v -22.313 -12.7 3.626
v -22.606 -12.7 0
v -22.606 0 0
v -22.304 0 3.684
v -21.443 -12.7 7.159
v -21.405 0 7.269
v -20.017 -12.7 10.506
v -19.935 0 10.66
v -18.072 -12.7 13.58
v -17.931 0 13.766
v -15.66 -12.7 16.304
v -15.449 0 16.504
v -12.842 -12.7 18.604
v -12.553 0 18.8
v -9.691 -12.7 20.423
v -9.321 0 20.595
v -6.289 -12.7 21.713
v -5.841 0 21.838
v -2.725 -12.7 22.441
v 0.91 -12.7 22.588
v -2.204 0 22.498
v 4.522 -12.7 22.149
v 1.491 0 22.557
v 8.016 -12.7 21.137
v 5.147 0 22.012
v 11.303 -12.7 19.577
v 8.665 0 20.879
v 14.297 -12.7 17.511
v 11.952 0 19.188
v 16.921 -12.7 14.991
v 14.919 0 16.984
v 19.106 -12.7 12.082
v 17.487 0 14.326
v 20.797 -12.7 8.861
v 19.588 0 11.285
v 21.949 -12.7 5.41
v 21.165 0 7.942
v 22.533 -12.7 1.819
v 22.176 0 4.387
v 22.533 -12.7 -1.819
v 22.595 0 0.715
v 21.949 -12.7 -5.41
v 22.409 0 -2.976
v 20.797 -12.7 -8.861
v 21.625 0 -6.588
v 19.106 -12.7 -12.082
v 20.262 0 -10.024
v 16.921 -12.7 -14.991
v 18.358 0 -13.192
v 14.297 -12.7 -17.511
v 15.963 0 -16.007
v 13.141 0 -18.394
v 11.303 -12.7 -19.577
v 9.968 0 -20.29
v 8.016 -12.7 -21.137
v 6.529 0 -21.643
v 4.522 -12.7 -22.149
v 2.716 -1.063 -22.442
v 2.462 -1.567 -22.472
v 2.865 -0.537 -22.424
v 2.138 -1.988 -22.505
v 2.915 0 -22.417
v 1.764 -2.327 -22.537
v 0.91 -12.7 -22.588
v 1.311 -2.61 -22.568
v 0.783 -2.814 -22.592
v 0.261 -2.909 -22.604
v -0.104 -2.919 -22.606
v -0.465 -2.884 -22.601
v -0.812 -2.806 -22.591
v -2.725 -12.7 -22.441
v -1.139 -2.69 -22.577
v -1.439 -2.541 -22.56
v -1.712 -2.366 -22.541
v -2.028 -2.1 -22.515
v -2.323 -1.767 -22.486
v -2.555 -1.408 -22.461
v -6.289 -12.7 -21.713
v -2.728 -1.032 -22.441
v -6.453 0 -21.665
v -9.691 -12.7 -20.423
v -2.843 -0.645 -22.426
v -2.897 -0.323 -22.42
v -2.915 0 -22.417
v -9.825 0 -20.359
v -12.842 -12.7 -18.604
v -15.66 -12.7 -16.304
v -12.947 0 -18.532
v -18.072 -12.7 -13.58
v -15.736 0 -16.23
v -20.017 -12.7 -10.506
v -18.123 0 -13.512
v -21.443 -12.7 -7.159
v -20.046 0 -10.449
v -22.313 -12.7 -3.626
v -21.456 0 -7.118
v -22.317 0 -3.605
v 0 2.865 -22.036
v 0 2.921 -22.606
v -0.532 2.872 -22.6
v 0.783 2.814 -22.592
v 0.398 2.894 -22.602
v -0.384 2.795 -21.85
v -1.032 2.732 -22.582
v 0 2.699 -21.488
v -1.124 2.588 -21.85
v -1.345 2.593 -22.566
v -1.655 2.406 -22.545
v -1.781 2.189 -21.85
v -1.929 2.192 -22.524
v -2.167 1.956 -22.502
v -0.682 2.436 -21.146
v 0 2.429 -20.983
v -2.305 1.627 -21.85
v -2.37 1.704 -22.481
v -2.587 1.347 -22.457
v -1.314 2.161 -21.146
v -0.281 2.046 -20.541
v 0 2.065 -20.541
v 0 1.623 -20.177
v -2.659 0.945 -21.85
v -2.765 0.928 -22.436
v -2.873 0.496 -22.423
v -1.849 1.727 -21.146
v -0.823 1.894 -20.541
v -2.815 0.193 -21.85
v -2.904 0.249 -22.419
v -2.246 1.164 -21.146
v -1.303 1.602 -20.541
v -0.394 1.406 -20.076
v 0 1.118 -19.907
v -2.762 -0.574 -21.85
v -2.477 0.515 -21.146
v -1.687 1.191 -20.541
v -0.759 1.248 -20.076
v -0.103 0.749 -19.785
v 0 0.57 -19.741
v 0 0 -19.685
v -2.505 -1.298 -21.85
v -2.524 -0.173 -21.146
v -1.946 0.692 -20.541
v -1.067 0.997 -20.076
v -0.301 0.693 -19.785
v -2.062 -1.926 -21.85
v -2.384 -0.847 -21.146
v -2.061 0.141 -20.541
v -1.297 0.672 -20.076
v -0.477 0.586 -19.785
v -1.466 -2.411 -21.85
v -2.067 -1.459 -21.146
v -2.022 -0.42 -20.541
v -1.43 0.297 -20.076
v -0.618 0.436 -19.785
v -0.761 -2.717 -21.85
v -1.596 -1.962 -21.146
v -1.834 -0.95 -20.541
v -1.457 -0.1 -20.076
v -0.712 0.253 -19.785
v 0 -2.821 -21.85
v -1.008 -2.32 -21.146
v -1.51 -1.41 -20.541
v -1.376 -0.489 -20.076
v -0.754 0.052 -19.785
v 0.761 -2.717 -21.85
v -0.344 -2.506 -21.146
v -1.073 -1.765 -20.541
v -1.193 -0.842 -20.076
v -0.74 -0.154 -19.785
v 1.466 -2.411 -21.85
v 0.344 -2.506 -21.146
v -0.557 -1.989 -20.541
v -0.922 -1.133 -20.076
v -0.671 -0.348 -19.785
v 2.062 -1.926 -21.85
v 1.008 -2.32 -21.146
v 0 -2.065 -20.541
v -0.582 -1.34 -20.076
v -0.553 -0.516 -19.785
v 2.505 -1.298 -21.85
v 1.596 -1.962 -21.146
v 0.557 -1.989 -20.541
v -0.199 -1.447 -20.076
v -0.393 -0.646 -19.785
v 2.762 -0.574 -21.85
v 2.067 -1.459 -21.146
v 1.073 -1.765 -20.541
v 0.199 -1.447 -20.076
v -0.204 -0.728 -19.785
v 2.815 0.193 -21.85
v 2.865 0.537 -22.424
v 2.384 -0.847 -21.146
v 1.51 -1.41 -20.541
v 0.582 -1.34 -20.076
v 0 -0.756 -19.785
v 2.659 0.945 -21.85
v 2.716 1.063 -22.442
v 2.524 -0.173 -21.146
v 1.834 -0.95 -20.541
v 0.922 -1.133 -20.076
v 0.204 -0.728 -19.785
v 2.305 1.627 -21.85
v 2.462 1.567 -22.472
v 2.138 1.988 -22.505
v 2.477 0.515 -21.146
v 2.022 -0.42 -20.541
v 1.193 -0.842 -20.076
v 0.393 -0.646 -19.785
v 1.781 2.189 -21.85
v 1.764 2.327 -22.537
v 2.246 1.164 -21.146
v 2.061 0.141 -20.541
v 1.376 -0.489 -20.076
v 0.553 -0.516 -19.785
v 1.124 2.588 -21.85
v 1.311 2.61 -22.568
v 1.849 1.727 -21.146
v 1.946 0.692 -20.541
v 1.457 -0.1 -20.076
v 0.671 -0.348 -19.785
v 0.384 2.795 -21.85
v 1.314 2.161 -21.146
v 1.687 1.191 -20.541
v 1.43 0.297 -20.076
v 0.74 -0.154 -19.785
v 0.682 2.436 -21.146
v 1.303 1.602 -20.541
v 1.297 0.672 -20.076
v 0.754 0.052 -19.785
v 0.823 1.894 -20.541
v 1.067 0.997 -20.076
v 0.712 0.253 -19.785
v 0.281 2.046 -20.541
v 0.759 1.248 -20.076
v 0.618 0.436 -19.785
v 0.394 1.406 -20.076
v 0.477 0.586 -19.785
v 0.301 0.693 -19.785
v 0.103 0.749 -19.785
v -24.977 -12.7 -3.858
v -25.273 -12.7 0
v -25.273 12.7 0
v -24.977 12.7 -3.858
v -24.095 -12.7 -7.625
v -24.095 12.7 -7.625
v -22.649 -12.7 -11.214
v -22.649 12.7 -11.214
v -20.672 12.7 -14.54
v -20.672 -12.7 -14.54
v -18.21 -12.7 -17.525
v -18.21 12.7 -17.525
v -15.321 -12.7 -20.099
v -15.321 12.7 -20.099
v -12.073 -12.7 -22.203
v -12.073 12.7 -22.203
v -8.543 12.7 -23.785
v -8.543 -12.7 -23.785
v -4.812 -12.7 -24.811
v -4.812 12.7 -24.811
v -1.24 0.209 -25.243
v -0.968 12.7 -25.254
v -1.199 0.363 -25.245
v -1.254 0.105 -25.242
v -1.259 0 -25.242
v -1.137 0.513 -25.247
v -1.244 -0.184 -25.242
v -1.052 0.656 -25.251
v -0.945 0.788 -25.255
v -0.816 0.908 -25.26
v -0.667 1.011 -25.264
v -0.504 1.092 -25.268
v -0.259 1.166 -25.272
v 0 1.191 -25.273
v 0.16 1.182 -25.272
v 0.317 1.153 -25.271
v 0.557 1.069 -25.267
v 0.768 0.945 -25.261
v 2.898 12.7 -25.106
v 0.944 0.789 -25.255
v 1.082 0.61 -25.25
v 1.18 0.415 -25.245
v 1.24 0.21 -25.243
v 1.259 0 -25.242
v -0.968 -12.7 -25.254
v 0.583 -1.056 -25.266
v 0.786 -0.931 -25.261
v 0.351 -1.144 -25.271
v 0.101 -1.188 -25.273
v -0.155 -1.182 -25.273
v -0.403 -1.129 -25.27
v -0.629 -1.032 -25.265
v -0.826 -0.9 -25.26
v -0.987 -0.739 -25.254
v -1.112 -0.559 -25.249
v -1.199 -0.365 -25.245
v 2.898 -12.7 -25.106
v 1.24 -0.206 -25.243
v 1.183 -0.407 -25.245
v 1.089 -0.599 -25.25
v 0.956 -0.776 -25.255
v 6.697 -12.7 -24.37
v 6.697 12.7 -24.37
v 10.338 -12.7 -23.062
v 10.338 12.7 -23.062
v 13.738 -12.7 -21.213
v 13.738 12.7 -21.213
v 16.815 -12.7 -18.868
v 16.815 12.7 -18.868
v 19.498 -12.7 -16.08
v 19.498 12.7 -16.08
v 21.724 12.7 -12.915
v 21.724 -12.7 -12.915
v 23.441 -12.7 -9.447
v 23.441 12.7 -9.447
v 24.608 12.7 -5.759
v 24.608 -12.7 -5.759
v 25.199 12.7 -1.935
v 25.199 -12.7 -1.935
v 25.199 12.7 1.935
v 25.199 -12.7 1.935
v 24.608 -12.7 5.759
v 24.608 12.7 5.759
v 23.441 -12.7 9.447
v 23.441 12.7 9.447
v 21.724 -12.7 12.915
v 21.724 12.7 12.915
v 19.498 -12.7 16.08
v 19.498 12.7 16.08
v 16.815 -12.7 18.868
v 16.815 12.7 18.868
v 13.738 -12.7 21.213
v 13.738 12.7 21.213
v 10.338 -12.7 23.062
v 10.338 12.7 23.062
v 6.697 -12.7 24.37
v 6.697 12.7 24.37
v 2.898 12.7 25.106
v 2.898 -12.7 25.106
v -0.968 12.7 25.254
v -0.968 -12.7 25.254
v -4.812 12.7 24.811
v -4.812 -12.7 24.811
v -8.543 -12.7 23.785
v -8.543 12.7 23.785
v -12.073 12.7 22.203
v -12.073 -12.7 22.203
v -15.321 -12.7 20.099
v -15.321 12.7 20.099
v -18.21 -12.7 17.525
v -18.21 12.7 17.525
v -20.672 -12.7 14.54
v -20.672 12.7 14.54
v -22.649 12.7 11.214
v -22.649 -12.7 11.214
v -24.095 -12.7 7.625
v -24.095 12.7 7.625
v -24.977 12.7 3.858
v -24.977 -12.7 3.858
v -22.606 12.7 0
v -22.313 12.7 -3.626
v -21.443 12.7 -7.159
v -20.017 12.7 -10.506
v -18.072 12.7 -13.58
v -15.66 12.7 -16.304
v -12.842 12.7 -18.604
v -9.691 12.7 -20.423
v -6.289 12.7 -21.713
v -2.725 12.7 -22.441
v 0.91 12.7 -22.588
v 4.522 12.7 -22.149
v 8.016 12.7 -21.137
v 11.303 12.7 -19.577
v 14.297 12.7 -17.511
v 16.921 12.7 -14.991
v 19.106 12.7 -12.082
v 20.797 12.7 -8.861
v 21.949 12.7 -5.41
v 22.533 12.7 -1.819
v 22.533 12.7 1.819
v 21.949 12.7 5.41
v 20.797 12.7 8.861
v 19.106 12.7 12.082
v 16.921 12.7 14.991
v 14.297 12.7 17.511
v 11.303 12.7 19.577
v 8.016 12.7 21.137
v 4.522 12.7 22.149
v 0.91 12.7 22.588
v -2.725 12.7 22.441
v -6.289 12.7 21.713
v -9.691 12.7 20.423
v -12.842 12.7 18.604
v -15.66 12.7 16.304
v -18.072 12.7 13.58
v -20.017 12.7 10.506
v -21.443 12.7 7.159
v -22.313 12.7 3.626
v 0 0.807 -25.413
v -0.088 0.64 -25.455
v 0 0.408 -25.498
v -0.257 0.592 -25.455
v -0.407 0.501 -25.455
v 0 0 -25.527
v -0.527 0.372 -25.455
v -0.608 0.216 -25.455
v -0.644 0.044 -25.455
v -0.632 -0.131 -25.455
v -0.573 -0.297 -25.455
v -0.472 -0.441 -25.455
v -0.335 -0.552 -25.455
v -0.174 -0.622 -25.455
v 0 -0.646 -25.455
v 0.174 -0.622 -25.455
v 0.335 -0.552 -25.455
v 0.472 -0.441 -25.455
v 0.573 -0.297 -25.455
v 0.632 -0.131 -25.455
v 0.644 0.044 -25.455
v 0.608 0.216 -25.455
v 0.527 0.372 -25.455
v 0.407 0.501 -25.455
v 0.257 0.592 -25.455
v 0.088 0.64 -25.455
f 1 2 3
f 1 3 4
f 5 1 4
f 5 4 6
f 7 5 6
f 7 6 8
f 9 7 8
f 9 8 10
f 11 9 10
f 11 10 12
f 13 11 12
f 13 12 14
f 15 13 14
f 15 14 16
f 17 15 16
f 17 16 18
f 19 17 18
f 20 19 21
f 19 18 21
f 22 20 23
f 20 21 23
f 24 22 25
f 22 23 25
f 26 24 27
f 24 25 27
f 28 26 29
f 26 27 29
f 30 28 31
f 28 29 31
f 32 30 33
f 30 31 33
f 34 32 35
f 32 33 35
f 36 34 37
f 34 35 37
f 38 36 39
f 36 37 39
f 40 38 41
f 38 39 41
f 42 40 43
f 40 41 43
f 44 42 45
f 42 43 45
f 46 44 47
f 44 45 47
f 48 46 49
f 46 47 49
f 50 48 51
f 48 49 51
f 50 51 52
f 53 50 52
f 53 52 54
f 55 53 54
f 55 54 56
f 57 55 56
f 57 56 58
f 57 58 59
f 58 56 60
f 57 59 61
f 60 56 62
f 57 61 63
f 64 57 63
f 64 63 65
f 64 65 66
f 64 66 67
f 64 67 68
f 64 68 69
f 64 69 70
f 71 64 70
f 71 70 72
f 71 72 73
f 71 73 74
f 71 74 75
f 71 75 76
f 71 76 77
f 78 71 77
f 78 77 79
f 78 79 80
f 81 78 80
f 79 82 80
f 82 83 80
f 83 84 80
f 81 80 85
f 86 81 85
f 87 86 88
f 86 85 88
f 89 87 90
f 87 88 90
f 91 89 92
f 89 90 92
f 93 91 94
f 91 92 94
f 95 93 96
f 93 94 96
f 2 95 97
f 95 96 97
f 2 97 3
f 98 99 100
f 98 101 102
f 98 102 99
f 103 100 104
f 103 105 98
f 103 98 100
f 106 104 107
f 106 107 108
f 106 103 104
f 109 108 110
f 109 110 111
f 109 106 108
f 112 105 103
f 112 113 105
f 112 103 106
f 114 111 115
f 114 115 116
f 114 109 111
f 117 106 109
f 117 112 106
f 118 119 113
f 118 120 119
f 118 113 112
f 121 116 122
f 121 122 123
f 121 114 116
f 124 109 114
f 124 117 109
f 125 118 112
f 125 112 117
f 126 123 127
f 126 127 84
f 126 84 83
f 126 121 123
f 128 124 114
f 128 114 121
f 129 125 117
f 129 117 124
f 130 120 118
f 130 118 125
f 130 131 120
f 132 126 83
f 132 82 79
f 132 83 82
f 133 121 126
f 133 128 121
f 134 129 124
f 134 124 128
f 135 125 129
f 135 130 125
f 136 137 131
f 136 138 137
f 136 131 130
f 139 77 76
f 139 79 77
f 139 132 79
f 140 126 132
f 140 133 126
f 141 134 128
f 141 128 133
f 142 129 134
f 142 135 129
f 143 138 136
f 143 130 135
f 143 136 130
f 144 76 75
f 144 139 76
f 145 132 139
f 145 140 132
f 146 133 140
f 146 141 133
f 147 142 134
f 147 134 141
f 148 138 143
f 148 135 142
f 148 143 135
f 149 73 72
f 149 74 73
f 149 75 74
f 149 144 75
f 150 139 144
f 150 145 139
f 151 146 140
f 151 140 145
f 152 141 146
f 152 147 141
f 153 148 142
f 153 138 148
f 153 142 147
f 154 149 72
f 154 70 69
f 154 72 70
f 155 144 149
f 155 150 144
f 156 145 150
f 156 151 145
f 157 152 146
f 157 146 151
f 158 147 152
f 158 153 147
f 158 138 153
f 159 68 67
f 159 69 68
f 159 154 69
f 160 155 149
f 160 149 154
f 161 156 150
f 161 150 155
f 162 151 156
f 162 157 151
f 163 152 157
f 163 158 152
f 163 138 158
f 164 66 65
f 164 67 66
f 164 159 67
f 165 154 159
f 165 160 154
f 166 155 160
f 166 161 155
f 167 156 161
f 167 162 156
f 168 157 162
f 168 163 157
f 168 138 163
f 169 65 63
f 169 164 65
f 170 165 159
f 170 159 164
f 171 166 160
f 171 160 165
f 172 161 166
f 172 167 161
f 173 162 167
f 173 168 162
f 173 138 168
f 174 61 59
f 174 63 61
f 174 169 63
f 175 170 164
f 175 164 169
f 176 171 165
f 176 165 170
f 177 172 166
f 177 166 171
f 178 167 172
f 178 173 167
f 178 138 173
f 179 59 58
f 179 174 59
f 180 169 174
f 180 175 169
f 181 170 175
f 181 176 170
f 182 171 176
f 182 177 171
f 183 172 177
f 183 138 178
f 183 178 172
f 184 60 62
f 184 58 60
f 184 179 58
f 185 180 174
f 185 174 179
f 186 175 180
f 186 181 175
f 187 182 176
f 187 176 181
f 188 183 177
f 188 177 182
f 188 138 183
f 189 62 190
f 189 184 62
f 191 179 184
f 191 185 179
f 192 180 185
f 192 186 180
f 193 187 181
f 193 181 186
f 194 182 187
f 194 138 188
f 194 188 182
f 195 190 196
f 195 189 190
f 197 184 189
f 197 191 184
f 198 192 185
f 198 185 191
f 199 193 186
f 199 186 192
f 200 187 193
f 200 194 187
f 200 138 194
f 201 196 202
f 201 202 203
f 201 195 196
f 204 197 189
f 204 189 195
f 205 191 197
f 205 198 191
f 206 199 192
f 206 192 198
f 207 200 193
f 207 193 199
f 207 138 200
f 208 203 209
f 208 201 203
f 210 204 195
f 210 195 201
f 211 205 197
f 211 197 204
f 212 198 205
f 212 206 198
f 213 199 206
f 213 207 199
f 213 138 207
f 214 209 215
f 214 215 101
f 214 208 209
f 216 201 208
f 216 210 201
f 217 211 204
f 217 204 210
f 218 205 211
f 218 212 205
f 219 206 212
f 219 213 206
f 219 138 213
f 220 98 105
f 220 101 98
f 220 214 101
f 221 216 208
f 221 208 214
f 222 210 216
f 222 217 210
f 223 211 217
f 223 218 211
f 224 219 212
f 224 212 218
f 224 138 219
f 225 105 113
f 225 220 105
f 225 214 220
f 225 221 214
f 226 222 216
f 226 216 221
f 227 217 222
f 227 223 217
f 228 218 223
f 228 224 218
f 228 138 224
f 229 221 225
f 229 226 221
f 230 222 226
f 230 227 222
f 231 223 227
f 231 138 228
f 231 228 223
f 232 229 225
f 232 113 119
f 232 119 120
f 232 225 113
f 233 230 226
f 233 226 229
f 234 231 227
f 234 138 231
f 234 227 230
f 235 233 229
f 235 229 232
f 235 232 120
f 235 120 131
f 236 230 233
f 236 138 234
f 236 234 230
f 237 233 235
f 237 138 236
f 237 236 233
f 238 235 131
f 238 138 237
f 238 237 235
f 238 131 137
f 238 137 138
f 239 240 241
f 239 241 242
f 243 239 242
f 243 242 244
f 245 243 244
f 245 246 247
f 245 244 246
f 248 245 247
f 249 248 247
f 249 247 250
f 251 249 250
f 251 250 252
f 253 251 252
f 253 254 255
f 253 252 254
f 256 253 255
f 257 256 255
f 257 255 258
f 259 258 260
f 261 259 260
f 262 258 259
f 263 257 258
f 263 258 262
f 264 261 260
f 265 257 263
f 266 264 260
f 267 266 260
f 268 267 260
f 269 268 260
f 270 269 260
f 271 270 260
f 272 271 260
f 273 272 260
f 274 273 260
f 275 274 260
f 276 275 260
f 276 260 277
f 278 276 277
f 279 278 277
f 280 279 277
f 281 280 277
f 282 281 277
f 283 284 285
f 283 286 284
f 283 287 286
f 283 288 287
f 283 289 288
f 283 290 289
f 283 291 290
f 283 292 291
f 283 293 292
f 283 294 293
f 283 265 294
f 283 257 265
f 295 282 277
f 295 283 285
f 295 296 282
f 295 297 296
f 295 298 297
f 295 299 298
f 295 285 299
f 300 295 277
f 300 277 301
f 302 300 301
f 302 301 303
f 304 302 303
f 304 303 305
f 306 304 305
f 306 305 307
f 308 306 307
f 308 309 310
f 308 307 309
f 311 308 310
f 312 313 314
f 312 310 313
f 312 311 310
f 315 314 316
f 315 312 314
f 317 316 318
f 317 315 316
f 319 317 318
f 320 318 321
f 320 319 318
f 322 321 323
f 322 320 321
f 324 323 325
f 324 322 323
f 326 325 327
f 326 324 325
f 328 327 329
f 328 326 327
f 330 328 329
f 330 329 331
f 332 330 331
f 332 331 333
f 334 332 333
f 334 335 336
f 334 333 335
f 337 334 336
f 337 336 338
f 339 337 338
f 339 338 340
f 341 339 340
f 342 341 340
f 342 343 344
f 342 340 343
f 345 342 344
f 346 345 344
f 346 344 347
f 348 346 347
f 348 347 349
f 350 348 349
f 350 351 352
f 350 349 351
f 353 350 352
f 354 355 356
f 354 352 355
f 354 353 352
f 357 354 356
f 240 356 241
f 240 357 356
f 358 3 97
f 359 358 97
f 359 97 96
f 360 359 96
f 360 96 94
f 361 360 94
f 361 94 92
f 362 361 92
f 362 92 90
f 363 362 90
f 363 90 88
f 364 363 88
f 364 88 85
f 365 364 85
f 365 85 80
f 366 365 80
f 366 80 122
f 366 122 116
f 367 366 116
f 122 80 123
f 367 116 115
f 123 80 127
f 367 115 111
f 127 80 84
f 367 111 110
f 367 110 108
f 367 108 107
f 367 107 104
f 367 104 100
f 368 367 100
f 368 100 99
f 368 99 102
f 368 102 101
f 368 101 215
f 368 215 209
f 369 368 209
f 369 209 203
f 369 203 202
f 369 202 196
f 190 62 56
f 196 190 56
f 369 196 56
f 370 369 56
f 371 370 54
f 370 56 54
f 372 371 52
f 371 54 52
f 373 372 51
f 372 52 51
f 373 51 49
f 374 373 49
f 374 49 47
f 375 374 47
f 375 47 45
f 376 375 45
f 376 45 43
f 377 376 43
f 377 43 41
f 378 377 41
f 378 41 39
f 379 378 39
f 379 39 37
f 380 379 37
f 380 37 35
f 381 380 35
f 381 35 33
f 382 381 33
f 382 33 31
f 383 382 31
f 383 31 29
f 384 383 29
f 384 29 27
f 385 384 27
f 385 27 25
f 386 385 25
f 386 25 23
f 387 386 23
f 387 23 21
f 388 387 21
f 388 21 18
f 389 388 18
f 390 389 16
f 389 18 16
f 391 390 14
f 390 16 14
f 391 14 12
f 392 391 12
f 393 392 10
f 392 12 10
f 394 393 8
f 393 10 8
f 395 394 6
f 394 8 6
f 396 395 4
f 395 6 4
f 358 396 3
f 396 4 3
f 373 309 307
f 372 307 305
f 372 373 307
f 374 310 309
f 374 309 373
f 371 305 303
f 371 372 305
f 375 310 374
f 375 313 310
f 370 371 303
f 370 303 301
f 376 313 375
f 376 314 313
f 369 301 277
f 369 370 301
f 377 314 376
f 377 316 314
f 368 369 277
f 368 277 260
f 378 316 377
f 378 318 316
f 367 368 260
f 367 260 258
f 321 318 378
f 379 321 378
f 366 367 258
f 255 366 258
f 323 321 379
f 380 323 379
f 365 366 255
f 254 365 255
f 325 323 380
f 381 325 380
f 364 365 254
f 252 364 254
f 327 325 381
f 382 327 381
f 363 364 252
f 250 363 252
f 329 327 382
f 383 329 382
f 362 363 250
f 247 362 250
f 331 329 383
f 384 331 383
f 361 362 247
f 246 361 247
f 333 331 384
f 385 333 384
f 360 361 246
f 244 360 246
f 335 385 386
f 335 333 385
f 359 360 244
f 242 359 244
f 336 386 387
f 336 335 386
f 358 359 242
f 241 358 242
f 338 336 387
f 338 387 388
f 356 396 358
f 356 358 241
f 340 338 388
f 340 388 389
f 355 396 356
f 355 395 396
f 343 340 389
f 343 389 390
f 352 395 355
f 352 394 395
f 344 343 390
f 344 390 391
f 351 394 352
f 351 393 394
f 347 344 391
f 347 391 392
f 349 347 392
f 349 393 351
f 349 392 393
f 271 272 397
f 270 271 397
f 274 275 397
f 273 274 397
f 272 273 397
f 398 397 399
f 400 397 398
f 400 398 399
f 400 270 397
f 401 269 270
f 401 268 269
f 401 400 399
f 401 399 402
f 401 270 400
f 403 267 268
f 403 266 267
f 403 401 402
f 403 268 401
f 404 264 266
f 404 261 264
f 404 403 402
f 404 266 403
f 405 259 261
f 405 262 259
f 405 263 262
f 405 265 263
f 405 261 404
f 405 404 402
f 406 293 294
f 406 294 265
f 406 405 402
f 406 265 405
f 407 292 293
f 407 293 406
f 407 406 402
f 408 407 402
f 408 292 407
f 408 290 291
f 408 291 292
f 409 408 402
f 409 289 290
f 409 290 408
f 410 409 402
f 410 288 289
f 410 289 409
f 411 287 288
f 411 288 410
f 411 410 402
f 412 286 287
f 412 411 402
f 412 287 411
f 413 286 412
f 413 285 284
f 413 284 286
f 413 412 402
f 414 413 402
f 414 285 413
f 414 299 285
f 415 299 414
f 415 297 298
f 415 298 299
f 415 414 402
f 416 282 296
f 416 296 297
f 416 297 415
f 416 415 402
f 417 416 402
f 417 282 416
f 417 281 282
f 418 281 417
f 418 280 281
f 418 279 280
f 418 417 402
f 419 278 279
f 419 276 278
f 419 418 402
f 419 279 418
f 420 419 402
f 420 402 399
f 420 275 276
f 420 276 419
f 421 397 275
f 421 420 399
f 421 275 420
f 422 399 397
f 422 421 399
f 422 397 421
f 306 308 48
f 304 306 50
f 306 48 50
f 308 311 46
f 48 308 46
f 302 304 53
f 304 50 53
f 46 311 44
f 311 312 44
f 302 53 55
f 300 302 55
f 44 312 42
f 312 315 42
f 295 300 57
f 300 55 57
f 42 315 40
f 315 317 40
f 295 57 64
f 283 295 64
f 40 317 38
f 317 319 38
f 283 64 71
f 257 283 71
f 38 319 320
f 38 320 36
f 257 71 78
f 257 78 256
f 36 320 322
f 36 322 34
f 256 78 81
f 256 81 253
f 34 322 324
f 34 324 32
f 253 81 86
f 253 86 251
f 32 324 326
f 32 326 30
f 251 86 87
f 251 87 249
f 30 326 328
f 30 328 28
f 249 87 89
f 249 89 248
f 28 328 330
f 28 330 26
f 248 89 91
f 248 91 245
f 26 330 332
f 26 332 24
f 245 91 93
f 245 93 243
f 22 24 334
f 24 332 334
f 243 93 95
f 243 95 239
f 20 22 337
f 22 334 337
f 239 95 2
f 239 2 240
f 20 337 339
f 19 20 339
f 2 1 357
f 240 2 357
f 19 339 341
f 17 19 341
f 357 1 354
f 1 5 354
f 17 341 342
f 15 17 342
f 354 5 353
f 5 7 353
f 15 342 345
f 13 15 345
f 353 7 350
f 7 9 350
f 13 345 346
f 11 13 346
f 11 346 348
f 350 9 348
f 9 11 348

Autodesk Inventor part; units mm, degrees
ref_plane "YZ Plane" through (0, 0, 0) normal (1, 0, 0) x (0, 1, 0)
ref_plane "XZ Plane" through (0, 0, 0) normal (0, 1, 0) x (-1, 0, 0)
ref_plane "XY Plane" through (0, 0, 0) normal (0, 0, 1) x (1, 0, 0)
sketch "Sketch1" plane through (0, 0, 0) normal (0, 1, 0) x (-1, 0, 0)
  circle A0 centre (0, 0) radius 22.606
  circle A1 centre (0, 0) radius 25.273
  dimension "d0" = 45.212
  dimension "d1" = 50.546
extrude "Extrusion1" add sketch "Sketch1" along normal mid plane 25.4
sketch "Sketch5" plane through (0, 0, 0) normal (1, 0, 0) x (0, 1, 0)
  line L0 (-12.7, -22.606) -> (12.7, -22.606) projected
  arc A0 (0, -25.527) -> (0, -19.685) centre (0, -22.606) ccw
  line L1 (0, -25.527) -> (0, -19.685)
  line L2 (0, -25.527) -> (0, -19.685) construction
  point P0 (0, 0)
  dimension "d7" = 2.921
revolve "Revolution2" add sketch "Sketch5" angle 360 about axis through (0, 0, -25.527) along (0, 0, 1)
properties part number "ExternalMotorizedOuterRing" material "PET Plastic"
